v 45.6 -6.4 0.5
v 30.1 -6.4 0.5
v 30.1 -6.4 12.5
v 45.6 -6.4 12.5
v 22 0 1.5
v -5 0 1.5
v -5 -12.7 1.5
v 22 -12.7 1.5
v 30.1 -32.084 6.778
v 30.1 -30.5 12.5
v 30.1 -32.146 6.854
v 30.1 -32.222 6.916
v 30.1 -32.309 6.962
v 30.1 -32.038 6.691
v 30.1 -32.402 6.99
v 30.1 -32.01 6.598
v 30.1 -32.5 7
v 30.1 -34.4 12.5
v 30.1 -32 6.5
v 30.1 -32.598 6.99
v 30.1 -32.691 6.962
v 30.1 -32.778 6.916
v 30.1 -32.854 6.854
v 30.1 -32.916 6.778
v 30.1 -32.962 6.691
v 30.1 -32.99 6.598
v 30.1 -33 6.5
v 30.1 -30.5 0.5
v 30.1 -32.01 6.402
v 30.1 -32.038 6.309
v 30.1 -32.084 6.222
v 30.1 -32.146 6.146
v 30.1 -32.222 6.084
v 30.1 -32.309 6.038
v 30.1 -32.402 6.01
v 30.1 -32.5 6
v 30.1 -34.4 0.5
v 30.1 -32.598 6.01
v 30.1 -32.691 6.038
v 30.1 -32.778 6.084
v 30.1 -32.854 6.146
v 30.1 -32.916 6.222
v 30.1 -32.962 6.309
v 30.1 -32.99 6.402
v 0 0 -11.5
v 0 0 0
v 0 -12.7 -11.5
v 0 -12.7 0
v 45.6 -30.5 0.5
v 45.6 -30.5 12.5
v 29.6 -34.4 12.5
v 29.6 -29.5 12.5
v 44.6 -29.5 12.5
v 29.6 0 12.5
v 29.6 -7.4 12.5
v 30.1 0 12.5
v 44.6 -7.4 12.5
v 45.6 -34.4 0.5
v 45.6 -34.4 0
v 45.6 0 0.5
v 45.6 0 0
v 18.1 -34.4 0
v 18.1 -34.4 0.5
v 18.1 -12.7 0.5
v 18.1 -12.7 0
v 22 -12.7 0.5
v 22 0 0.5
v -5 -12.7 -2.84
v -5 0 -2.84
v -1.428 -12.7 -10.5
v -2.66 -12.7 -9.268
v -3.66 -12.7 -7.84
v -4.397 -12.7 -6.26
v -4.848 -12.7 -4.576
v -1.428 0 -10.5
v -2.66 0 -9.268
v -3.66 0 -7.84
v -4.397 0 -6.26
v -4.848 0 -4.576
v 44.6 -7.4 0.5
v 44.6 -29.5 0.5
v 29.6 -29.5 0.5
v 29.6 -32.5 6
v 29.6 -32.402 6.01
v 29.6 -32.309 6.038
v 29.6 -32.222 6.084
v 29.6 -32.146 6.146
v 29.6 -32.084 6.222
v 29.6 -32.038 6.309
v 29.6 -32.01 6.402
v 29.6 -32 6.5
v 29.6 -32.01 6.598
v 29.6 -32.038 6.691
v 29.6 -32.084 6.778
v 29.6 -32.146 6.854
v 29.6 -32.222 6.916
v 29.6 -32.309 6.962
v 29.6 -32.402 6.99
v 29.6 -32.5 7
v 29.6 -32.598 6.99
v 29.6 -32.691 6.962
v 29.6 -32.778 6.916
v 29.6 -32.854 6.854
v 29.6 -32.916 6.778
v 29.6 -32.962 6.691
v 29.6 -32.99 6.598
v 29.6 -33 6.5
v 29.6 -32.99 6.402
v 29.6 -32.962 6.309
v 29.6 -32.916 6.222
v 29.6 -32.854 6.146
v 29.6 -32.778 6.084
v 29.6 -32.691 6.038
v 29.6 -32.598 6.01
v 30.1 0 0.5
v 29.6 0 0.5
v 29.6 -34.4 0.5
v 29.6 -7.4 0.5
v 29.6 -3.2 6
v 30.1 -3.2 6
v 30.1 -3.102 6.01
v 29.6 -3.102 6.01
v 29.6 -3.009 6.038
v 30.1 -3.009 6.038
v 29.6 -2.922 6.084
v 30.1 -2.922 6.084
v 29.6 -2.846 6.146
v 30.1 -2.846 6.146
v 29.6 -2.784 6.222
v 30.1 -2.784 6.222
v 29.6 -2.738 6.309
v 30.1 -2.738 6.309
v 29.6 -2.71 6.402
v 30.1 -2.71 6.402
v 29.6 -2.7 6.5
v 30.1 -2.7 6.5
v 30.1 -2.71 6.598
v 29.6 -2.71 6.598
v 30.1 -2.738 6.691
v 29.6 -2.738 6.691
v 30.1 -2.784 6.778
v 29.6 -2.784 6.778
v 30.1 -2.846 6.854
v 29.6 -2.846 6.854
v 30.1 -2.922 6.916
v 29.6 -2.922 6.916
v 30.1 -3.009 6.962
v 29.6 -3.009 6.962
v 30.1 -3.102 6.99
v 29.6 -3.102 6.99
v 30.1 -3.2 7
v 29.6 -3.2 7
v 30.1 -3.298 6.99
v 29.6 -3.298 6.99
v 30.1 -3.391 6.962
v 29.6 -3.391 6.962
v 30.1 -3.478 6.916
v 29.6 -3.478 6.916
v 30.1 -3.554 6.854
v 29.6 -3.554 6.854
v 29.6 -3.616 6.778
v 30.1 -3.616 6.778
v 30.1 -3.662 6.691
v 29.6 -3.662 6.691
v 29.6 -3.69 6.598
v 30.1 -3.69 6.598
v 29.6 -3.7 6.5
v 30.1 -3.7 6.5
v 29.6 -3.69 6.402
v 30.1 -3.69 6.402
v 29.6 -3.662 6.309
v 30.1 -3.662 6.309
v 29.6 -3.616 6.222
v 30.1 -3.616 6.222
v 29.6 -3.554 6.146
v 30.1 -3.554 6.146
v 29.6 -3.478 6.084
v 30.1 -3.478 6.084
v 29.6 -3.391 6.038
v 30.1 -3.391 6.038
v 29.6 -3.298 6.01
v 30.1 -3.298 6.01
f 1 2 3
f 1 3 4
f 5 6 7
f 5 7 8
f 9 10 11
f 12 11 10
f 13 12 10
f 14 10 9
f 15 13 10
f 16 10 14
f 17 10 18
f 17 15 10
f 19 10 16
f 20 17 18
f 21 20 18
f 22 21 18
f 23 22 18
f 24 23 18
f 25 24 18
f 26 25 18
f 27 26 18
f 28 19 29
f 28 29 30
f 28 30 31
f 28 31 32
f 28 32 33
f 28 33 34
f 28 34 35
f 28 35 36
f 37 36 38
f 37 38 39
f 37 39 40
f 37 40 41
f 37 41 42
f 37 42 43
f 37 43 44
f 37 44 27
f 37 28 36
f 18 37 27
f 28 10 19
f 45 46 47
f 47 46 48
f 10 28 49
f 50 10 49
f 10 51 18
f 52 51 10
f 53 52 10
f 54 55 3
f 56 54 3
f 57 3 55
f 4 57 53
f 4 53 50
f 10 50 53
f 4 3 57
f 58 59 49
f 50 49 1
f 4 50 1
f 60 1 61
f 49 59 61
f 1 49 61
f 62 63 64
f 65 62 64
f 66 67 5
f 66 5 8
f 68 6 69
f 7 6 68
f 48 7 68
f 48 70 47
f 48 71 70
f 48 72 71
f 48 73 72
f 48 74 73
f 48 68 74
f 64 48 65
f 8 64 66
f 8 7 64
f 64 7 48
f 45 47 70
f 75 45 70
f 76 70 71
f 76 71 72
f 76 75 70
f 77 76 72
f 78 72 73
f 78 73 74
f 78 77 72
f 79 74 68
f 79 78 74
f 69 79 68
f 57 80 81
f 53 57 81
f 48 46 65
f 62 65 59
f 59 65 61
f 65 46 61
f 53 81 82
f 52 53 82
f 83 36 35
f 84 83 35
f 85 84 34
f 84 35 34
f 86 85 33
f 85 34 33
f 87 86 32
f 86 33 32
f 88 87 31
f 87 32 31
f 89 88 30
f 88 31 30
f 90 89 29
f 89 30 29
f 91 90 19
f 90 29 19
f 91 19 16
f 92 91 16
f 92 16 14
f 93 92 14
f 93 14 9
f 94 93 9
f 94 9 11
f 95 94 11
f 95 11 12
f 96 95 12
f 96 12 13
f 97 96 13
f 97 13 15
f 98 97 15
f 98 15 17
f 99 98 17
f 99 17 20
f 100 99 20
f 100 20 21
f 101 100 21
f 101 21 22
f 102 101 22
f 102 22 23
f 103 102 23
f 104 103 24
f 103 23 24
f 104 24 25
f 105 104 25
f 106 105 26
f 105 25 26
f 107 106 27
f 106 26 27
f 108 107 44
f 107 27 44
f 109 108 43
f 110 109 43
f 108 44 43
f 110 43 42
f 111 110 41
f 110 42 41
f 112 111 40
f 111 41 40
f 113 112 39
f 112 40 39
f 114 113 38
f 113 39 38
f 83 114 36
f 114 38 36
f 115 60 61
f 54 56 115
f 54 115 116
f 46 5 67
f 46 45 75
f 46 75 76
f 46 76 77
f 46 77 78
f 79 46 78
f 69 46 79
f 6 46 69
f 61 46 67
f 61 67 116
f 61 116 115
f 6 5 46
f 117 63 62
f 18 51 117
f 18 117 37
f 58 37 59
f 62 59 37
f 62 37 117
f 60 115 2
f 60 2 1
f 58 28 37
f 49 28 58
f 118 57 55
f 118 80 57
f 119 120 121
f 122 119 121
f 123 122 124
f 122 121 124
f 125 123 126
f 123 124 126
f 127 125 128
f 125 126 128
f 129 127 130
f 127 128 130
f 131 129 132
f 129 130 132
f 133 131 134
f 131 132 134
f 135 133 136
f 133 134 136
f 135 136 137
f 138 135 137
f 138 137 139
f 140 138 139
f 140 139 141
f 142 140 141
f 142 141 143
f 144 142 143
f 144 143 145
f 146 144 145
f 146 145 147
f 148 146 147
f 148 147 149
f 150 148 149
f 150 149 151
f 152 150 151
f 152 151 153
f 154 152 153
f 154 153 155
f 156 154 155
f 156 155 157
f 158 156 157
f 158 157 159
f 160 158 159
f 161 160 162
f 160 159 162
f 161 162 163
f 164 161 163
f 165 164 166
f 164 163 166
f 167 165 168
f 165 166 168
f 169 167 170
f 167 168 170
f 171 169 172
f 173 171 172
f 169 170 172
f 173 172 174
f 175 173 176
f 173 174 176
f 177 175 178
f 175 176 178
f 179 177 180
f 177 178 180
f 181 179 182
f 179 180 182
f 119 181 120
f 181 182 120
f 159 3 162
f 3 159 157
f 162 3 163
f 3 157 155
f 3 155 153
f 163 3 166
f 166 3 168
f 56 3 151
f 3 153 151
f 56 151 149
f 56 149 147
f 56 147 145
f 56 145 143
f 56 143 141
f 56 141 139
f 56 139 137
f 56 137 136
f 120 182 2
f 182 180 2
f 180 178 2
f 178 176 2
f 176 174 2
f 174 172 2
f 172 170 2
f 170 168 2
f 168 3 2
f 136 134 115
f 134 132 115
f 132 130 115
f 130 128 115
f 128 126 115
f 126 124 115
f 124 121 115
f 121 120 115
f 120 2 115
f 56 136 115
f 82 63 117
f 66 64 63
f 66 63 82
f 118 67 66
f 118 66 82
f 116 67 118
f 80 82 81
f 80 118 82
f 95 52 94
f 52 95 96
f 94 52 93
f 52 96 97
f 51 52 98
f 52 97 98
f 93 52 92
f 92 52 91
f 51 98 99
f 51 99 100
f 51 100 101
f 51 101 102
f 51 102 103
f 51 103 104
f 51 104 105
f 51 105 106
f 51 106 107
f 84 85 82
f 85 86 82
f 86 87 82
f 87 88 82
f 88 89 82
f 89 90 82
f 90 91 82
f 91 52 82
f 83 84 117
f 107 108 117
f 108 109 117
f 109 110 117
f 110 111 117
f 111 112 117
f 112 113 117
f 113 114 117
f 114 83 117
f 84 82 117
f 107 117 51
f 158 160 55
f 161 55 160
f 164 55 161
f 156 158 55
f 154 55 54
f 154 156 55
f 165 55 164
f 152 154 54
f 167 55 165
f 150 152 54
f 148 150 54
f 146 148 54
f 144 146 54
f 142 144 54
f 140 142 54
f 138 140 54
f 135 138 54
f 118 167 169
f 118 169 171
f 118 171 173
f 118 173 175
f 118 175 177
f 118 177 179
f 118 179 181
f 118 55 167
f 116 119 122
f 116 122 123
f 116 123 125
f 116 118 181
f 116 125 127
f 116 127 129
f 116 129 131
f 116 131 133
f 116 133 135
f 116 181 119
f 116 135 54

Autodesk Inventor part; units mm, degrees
ref_plane "YZ Plane" through (0, 0, 0) normal (1, 0, 0) x (0, 1, 0)
ref_plane "XZ Plane" through (0, 0, 0) normal (0, 1, 0) x (-1, 0, 0)
ref_plane "XY Plane" through (0, 0, 0) normal (0, 0, 1) x (1, 0, 0)
sketch "Esboço1" plane through (0, 0, 0) normal (0, 0, 1) x (1, 0, 0)
  line L0 (0, 0) -> (50, 0)
  line L1 (50, 0) -> (50, -31.4)
  line L2 (50, -31.4) -> (0, -31.4)
  line L3 (0, -31.4) -> (0, 0)
  dimension "d0" = 50
  dimension "d1" = 31.4
extrude "Extrusão1" add sketch "Esboço1" along normal blind 0.5
sketch "Esboço2" plane through (0, 0, 0.5) normal (0, 0, 1) x (1, 0, 0)
  line L0 (0, -31.4) -> (50, -31.4) projected
  line L1 (50, -31.4) -> (43.6, -31.4)
  line L2 (43.6, -31.4) -> (43.6, 0)
  line L3 (50, 0) -> (0, 0) projected
  line L4 (43.6, 0) -> (50, 0)
  line L5 (50, -31.4) -> (50, 0) projected
  line L6 (50, 0) -> (50, -31.4)
  dimension "d4" = 6.4
extrude "Extrusão2" cut sketch "Esboço2" against normal blind 0.5
sketch "Esboço3" plane through (0, 0, 0.5) normal (0, 0, 1) x (1, 0, 0)
  line L0 (0, -31.4) -> (43.6, -31.4) projected
  line L1 (43.6, -31.4) -> (13.6, -31.4)
  line L2 (13.6, -31.4) -> (13.6, -34.4)
  line L3 (13.6, -34.4) -> (43.6, -34.4)
  line L4 (43.6, -34.4) -> (43.6, -31.4)
  point P0 (0, 0)
  dimension "d7" = 30
  dimension "d8" = 3
extrude "Extrusão3" add sketch "Esboço3" against normal blind 0.5
sketch "Esboço4" plane through (0, 0, 0.5) normal (0, 0, 1) x (1, 0, 0)
  line L0 (43.6, -34.4) -> (43.6, 0) projected
  line L1 (43.6, -34.4) -> (44.6, -34.4)
  line L2 (44.6, -34.4) -> (44.6, 0)
  line L3 (44.6, 0) -> (43.6, 0)
  line L4 (43.6, 0) -> (43.6, -34.4)
  point P0 (0, 0)
  dimension "d11" = 1
extrude "Extrusão4" add sketch "Esboço4" against normal blind 0.5
sketch "Esboço5" plane through (0, 0, 0.5) normal (0, 0, 1) x (1, 0, 0)
  line L0 (44.6, -34.4) -> (13.6, -34.4) projected
  line L1 (44.6, -34.4) -> (44.6, -29.5)
  line L2 (44.6, 0) -> (44.6, -34.4) projected
  line L3 (44.6, 0) -> (44.6, -7.4)
  line L4 (44.6, -7.4) -> (29.6, -7.4)
  line L5 (44.6, -29.5) -> (29.6, -29.5)
  line L6 (29.6, -29.5) -> (29.6, -30.5)
  line L7 (29.6, -30.5) -> (44.6, -30.5)
  line L8 (29.6, -7.4) -> (29.6, -6.4)
  line L9 (29.6, -6.4) -> (44.6, -6.4)
  line L10 (44.6, -7.4) -> (44.6, -6.4)
  line L11 (29.6, -6.4) -> (30.1, -6.4)
  line L12 (30.1, -6.4) -> (30.1, 0)
  line L13 (44.6, 0) -> (0, 0) projected
  line L14 (29.6, 0) -> (29.6, -6.4)
  line L15 (29.6, -30.5) -> (29.6, -34.4)
  line L16 (30.1, -30.5) -> (30.1, -34.4)
  line L17 (29.6, -34.4) -> (30.1, -34.4)
  dimension "d14" = 4.9
  dimension "d15" = 7.4
  dimension "d16" = 15
  dimension "d17" = 15
  dimension "d18" = 1
  dimension "d19" = 1
  dimension "d20" = 0.5
extrude "Extrusão5" add sketch "Esboço5" along normal blind 12 contours L0 L15 L7 L16 | L7 L6 L5 L1 | L2 L4 L8 L9 | L12 L9 L14 L13
sketch "Esboço6" plane through (0, 0, 0.5) normal (0, 0, 1) x (1, 0, 0)
  line L0 (44.6, -34.4) -> (44.6, -30.5) projected
  line L1 (44.6, -34.4) -> (45.6, -34.4)
  line L2 (45.6, -34.4) -> (45.6, 0)
  line L3 (45.6, 0) -> (44.6, 0)
  line L4 (44.6, 0) -> (44.6, -34.4)
  point P0 (0, 0)
  dimension "d23" = 1
extrude "Extrusão6" add sketch "Esboço6" against normal blind 0.5
sketch "Esboço7" plane through (0, 0, 0.5) normal (0, 0, 1) x (1, 0, 0)
  line L0 (44.6, -30.5) -> (30.1, -30.5) projected
  line L1 (44.6, -30.5) -> (45.6, -30.5)
  line L2 (45.6, -34.4) -> (45.6, 0) projected
  line L3 (45.6, -30.5) -> (45.6, -6.4)
  line L4 (30.1, -6.4) -> (44.6, -6.4) projected
  line L5 (44.6, -6.4) -> (45.6, -6.4)
  line L6 (44.6, -6.4) -> (44.6, -30.5)
  point P0 (0, 0)
extrude "Extrusão7" add sketch "Esboço7" along normal blind 12
sketch "Esboço8" plane through (0, 0, 0.5) normal (0, 0, 1) x (1, 0, 0)
  line L0 (29.6, -29.5) -> (29.6, -34.4) projected
  line L1 (29.6, -31.7209) -> (18.1, -31.7209)
  line L2 (18.1, -34.4) -> (18.1, -31.7209)
  line L3 (18.1, -31.7209) -> (18.1, -12.7)
  line L4 (18.1, -12.7) -> (0, -12.7)
  line L5 (0, 0) -> (0, -31.4) projected
  line L6 (18.1, -34.4) -> (0, -34.4)
  line L7 (0, -34.4) -> (0, -12.7)
  dimension "d28" = 11.5
extrude "Extrusão8" cut sketch "Esboço8" against normal blind 12
sketch "Esboço9" plane through (0, 0, 0.5) normal (0, 0, 1) x (1, 0, 0)
  line L0 (0, 0) -> (0, -12.7) projected
  line L1 (0, 0) -> (-5, 0)
  line L2 (-5, 0) -> (-5, -12.7)
  line L3 (-5, -12.7) -> (0, -12.7)
  line L4 (0, -12.7) -> (0, 0)
  dimension "d31" = 5
extrude "Extrusão9" add sketch "Esboço9" against normal blind 12
fillet "Arredondamento1" radius 10 1 edges at (-5, -6.35, -11.5)
sketch "Esboço10" plane through (0, 0, 0.5) normal (0, 0, 1) x (1, 0, 0)
  line L0 (-5, 0) -> (-5, -12.7) projected
  line L1 (-5, 0) -> (22, 0)
  line L2 (22, 0) -> (22, -12.7)
  line L3 (22, -12.7) -> (-5, -12.7)
  line L4 (-5, -12.7) -> (-5, 0)
  point P0 (0, 0)
  dimension "d37" = 27
extrude "Extrusão10" add sketch "Esboço10" along normal blind 1
sketch "Esboço11" plane through (30.1, -6.4, 0.5) normal (1, 0, 0) x (0, 0, -1)
  line L0 (0, 6.4) -> (-12, 6.4) projected
  line L1 (-12, 6.4) -> (-6, 6.4)
  line L2 (-6, 6.4) -> (-6, -28)
  line L3 (0, -28) -> (-12, -28) projected
  line L4 (-6, 6.4) -> (-6, 3.2)
  line L5 (-6, -28) -> (-6, -26.1)
  circle A0 centre (-6, -26.1) radius 0.5
  circle A1 centre (-6, 3.2) radius 0.5
  point P0 (0.5, 6.4)
  dimension "d38" = 3.2
  dimension "d39" = 1.9
  dimension "d40" = 1
  dimension "d41" = 1
extrude "Extrusão11" cut sketch "Esboço11" against normal blind 1
properties part number "tampa 2"
